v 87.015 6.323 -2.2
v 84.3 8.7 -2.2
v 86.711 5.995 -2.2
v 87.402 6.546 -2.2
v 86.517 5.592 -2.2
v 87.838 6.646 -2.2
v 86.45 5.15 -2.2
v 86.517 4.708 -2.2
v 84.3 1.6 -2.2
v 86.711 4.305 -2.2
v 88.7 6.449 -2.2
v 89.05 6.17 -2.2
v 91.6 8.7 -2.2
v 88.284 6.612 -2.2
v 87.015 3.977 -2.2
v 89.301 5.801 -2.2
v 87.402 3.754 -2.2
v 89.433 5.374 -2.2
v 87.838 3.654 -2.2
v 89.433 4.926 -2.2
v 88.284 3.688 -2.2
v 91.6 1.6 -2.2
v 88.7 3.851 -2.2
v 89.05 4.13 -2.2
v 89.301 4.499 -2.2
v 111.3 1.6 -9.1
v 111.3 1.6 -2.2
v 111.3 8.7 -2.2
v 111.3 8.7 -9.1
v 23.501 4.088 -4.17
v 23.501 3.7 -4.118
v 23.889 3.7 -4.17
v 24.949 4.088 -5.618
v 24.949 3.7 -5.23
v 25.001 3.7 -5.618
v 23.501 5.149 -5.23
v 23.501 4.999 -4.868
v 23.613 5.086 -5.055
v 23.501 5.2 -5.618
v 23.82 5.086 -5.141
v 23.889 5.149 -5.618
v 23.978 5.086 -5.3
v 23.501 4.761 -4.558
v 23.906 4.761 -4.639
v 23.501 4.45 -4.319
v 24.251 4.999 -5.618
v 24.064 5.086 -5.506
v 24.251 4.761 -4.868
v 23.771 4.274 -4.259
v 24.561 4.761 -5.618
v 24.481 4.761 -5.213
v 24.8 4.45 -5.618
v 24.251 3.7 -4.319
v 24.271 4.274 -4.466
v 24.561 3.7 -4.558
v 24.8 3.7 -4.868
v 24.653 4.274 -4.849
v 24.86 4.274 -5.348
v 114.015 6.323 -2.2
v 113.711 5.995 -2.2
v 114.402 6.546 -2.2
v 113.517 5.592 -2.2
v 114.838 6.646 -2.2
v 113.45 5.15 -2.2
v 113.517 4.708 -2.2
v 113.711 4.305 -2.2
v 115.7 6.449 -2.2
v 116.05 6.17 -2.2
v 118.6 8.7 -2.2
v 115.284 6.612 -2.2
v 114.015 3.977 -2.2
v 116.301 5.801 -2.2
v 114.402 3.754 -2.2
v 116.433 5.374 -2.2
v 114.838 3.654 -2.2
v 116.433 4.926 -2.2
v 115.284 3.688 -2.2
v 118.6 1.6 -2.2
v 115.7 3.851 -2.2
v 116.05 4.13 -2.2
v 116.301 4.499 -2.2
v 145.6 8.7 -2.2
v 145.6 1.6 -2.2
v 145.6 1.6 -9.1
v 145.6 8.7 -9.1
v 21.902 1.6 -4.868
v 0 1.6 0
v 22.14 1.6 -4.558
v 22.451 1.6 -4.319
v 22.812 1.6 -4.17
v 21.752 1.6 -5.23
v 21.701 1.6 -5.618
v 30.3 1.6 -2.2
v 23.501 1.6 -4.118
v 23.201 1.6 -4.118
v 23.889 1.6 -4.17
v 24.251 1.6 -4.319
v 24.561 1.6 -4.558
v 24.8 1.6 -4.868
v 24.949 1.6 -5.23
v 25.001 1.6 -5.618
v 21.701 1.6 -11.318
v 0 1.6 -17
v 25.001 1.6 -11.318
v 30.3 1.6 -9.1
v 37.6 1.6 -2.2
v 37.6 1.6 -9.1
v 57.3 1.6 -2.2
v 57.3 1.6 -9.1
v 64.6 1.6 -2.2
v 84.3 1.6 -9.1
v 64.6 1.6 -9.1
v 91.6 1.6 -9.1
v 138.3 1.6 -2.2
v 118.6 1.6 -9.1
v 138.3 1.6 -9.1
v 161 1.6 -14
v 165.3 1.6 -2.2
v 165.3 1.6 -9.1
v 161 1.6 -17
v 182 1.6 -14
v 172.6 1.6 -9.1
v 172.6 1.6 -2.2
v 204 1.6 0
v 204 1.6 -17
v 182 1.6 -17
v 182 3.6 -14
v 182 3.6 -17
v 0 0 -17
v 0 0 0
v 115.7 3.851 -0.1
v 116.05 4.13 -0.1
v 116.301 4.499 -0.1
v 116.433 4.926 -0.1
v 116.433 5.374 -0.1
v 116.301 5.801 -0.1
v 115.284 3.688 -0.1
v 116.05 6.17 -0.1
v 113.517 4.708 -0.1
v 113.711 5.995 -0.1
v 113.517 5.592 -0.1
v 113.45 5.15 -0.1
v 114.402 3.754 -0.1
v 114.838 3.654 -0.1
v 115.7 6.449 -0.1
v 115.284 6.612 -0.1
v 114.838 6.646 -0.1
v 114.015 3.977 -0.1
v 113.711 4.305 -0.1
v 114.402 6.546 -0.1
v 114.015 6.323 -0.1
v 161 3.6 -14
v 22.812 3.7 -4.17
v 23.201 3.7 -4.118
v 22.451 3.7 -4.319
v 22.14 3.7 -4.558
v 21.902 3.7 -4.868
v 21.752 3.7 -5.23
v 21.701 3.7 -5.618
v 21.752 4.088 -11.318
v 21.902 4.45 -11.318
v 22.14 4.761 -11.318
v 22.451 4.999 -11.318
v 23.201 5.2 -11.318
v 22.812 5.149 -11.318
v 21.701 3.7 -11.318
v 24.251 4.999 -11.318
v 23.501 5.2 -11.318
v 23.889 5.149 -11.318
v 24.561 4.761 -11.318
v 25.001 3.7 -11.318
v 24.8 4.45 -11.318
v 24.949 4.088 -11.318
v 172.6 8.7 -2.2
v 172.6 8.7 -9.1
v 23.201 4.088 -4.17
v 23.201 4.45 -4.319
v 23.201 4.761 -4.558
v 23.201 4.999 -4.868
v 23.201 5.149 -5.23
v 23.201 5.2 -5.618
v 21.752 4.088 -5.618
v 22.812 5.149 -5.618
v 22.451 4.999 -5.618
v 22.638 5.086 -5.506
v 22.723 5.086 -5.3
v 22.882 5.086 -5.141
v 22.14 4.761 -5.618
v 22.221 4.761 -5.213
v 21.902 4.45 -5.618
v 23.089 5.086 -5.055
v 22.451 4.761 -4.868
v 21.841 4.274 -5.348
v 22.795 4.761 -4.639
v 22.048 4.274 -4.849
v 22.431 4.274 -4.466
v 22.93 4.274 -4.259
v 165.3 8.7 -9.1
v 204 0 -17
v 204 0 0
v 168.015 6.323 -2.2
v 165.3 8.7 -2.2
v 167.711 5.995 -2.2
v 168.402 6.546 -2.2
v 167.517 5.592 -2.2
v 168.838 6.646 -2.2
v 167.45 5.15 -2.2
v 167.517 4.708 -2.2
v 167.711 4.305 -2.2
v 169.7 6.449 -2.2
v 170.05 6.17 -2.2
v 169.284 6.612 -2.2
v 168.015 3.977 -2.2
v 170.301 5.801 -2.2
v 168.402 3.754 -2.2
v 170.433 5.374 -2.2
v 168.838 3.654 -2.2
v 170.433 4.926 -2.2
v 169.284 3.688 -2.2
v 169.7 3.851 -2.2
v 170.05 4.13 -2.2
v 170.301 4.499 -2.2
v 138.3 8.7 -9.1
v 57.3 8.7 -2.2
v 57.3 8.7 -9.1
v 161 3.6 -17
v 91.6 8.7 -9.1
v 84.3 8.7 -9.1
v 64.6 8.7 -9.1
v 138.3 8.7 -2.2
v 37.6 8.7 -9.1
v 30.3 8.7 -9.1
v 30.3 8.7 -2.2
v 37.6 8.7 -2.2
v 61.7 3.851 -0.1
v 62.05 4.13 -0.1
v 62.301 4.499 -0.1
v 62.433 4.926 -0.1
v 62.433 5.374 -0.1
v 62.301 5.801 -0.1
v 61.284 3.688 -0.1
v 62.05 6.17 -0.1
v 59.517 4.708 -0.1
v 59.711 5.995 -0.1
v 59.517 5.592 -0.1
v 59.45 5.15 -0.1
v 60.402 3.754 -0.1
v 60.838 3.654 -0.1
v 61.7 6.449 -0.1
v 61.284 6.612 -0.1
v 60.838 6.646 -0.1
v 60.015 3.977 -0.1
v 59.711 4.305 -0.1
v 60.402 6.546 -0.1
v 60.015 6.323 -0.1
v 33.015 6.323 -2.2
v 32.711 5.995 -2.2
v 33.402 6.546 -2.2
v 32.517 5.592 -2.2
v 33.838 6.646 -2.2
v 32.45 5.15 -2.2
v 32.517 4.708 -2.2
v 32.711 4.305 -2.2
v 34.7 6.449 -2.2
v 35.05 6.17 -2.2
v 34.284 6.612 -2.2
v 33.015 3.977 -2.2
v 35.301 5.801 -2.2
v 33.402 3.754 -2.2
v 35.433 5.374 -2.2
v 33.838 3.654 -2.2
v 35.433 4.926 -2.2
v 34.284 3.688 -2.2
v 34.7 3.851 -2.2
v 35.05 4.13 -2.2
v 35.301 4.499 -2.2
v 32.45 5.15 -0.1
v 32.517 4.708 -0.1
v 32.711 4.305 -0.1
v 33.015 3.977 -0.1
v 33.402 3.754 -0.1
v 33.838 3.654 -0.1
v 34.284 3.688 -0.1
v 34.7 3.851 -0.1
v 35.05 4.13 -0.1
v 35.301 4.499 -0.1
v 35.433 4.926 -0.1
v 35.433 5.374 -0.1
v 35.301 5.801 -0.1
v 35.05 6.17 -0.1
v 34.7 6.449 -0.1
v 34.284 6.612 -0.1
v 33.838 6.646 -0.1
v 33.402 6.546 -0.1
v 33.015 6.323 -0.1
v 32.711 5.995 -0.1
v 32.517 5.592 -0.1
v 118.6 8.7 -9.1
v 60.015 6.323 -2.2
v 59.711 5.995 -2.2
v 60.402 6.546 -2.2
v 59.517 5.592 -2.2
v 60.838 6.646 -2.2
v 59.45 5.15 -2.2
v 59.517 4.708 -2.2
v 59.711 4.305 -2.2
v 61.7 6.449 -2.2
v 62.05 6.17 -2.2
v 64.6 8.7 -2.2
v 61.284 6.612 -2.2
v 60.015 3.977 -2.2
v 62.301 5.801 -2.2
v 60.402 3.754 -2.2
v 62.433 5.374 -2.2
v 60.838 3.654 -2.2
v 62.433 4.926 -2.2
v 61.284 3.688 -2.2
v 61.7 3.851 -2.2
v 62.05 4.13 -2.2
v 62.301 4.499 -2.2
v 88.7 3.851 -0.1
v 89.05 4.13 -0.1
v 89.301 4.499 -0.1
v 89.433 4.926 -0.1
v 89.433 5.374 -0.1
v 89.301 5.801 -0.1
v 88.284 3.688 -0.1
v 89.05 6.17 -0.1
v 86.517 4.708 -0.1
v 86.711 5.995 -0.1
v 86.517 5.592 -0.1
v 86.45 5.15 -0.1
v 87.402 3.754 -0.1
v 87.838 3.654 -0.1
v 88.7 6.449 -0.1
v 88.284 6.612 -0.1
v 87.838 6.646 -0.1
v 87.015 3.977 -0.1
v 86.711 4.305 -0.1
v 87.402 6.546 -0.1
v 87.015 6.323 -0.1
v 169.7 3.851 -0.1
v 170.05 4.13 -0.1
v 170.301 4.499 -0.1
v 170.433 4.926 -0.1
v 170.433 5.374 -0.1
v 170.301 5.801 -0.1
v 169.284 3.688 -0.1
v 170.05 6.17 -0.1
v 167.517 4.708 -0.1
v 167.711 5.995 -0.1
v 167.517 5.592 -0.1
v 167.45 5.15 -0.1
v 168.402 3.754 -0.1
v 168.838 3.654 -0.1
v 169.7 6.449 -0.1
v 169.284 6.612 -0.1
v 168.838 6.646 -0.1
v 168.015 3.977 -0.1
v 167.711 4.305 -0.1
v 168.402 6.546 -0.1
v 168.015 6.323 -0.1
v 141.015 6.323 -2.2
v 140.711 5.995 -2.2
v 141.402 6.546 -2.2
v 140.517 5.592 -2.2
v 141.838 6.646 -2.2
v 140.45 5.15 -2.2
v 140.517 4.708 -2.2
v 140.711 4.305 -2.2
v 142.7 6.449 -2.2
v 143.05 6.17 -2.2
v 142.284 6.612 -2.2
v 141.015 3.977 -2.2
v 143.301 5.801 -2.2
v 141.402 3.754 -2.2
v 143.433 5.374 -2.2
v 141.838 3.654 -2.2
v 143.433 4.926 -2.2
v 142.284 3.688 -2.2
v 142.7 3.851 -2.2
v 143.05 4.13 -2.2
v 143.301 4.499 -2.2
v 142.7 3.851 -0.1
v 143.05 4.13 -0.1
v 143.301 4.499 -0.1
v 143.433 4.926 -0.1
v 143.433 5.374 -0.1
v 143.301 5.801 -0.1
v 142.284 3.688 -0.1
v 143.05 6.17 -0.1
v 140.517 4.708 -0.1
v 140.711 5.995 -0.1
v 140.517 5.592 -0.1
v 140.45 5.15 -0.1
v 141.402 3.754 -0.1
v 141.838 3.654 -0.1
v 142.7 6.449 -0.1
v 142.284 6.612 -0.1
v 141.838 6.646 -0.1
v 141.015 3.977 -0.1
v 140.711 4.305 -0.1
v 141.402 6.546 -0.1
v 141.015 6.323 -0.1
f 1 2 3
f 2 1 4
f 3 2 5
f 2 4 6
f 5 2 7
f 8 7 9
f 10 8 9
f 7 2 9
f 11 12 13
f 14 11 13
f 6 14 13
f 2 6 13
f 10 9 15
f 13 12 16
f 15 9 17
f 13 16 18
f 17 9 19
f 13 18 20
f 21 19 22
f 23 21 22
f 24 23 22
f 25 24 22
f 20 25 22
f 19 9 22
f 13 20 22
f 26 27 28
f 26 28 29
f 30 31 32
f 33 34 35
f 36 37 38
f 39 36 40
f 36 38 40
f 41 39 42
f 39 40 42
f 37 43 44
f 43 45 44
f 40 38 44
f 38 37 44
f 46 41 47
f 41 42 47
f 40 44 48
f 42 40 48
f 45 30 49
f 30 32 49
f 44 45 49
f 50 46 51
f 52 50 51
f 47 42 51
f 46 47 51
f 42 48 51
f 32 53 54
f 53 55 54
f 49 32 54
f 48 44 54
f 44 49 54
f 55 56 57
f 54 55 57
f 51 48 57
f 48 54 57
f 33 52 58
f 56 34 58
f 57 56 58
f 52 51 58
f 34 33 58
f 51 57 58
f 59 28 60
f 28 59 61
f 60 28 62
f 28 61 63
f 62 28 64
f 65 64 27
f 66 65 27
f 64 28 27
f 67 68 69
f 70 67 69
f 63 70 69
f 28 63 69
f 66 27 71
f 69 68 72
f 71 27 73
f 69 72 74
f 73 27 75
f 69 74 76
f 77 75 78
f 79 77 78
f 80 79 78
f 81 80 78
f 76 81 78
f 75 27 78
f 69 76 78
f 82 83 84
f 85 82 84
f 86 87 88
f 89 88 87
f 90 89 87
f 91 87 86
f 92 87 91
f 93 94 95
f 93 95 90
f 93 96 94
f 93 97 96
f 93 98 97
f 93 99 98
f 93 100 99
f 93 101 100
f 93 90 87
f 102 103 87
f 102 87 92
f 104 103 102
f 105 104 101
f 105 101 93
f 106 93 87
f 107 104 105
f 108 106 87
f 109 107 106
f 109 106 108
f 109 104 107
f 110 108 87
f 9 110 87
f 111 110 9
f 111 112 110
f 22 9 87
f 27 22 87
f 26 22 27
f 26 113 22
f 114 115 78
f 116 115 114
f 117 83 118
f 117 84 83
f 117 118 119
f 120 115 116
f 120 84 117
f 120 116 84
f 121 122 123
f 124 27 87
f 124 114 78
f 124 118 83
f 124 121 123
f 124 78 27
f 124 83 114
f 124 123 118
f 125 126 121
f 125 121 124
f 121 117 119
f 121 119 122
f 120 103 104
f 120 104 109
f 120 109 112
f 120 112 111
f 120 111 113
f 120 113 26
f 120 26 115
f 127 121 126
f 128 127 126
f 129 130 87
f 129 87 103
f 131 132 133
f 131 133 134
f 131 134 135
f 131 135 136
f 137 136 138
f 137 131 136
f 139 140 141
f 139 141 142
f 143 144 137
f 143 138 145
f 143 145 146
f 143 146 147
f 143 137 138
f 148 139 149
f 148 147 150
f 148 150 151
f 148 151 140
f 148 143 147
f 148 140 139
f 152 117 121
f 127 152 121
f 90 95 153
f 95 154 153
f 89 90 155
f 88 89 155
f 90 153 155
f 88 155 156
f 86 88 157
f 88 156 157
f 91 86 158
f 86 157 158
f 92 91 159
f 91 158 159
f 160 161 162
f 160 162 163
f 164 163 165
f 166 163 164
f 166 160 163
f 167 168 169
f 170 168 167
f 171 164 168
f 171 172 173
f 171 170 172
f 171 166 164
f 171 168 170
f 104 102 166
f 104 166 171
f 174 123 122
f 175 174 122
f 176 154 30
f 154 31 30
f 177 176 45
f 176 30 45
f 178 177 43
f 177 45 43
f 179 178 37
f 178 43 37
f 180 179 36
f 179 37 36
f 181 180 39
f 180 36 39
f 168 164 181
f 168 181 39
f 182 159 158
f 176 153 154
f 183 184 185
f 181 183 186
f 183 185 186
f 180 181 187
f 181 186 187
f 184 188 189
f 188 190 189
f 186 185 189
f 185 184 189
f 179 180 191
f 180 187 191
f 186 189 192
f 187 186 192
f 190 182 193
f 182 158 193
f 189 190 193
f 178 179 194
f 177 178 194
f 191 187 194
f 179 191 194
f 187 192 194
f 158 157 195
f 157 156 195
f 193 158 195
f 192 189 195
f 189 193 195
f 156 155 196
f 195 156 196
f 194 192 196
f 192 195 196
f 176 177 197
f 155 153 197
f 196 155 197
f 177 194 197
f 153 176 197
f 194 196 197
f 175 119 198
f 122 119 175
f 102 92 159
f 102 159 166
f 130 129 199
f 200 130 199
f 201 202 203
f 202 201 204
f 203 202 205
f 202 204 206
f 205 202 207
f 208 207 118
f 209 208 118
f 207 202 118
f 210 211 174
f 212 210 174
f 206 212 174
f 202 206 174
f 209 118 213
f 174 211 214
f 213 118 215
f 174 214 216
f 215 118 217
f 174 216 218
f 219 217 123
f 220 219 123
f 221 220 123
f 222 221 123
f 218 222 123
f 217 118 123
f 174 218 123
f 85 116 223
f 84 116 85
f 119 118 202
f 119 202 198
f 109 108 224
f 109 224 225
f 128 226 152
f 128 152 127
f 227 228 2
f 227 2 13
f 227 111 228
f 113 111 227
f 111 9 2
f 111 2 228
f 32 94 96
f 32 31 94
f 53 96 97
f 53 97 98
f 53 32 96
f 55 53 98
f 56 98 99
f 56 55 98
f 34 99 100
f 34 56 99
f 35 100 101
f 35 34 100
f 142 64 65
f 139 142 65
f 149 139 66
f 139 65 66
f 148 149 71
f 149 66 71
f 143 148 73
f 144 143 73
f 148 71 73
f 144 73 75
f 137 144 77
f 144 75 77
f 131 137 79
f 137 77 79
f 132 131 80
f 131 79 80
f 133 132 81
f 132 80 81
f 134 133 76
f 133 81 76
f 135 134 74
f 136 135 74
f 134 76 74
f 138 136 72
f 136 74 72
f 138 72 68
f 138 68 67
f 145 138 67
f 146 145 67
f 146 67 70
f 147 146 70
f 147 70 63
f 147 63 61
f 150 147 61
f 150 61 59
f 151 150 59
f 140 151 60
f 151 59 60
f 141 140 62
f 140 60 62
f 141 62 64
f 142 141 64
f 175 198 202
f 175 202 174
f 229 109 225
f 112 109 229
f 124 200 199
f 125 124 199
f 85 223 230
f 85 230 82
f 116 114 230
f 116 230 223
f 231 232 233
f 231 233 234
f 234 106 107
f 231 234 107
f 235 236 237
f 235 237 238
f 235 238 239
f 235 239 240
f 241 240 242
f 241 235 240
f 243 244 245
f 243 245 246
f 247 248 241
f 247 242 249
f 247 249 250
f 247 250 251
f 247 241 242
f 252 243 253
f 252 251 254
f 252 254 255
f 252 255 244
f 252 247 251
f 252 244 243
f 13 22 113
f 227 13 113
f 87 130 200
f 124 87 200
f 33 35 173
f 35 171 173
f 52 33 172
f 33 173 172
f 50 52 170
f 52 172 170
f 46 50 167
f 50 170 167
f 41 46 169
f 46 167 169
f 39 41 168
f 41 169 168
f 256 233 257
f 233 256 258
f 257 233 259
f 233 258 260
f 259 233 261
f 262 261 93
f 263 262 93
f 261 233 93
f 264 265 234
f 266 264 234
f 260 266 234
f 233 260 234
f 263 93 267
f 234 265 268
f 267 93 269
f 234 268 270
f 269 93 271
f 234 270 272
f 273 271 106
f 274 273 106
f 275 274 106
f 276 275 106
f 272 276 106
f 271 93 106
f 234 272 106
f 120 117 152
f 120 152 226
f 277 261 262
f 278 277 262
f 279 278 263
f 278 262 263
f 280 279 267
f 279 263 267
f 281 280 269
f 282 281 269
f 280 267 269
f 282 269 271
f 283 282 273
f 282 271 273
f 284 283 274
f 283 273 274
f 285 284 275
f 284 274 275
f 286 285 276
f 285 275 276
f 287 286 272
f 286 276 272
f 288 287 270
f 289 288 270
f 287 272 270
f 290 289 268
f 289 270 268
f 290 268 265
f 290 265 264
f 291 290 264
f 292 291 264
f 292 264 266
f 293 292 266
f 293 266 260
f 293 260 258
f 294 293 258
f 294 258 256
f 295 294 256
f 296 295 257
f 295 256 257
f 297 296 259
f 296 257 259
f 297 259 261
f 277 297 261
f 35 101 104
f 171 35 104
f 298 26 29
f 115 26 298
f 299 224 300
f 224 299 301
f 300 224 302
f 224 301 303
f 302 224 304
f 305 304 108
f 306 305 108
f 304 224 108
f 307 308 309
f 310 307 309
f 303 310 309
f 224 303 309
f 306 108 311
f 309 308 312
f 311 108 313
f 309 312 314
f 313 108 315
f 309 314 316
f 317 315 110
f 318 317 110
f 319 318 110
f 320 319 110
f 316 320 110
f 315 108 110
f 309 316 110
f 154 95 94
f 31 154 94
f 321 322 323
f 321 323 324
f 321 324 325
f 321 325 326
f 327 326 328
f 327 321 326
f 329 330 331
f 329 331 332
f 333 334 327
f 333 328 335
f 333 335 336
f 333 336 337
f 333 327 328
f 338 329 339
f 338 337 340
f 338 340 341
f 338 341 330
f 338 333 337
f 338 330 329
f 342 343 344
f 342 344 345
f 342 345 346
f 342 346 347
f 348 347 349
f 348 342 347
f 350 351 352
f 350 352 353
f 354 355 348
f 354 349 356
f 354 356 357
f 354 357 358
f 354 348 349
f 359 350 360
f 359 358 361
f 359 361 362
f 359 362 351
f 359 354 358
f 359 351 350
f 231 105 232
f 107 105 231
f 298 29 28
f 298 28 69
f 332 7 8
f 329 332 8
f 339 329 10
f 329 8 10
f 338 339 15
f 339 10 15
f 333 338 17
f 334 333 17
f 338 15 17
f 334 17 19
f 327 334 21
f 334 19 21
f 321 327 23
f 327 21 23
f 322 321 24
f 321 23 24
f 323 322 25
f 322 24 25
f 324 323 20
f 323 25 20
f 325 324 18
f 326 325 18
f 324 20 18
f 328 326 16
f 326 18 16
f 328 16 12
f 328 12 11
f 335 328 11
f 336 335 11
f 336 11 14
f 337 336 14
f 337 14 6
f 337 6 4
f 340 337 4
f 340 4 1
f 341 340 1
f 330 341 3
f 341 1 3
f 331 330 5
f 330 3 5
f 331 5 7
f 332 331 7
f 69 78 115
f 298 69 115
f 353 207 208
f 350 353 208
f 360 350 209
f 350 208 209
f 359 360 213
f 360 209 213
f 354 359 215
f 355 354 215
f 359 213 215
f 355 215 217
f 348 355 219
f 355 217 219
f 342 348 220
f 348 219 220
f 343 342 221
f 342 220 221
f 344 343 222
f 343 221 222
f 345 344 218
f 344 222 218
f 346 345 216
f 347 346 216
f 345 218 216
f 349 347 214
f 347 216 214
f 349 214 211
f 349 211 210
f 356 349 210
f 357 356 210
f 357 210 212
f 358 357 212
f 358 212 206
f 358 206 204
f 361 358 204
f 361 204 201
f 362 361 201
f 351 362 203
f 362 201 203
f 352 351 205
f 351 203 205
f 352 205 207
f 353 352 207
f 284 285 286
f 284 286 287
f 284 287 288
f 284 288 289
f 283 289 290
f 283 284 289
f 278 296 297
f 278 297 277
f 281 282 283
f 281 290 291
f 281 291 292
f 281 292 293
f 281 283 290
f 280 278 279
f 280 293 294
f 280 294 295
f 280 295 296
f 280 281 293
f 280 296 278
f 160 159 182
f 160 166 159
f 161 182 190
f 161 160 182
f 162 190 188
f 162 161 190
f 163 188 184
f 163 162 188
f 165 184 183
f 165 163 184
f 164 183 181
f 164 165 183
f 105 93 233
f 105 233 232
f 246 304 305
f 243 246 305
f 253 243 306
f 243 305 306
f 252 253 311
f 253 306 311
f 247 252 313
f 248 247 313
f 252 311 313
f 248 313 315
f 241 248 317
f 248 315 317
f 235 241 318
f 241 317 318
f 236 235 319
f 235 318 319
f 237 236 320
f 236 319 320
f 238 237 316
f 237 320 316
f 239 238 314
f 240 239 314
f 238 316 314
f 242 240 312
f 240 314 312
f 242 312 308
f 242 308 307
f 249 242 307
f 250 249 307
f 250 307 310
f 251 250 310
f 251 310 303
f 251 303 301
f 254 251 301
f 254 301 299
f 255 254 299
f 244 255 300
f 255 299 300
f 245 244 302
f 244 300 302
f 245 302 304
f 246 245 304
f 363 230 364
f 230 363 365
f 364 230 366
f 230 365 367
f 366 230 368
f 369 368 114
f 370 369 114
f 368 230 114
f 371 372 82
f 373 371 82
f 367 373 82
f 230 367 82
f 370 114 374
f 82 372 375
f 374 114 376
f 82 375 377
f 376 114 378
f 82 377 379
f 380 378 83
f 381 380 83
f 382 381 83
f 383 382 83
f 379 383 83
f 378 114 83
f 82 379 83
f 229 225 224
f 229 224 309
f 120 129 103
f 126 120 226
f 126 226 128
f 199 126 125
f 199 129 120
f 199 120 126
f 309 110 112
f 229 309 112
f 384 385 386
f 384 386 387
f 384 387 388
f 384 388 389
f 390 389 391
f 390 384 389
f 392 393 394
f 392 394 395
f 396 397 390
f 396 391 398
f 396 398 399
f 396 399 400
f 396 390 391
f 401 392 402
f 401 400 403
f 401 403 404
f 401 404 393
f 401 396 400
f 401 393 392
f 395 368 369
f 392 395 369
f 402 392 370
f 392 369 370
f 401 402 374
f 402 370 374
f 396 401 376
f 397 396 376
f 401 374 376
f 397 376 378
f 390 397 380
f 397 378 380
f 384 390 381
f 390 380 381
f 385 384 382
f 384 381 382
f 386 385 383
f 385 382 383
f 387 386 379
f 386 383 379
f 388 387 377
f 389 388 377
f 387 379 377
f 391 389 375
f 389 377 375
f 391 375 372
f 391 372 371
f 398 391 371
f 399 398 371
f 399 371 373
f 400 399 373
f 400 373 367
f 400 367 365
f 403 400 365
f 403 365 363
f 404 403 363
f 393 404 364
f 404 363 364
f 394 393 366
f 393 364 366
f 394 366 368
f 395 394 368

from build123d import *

# Parameters (mm, degrees)
SKETCH1_W           = 204
SKETCH1_H           = 17
BOSS_EXTRUDE1_DEPTH = 1.6
SKETCH2_W           = 7.3
SKETCH2_H           = 6.9
BOSS_EXTRUDE2_DEPTH = 7.1
SKETCH6_R           = 1.5
BOSS_EXTRUDE6_DEPTH = 2.1
SKETCH4_W           = 3.3
SKETCH4_H           = 7.2
BOSS_EXTRUDE4_DEPTH = 3.6
SKETCH5_W           = 21
SKETCH5_H           = 3
BOSS_EXTRUDE5_DEPTH = 2
LPATTERN1_COUNT     = 6
LPATTERN1_PITCH     = 27
FILLET1_R           = 1.5


with BuildPart() as part:
    # Sketch1 → Boss-Extrude1 (new body)
    with BuildSketch(Plane(origin=(0, 0, 0), x_dir=(1, 0, 0), z_dir=(0, 1, 0))):
        with Locations((102, 8.5)):
            Rectangle(SKETCH1_W, SKETCH1_H)
    extrude(amount=BOSS_EXTRUDE1_DEPTH)

    # Sketch2 → Boss-Extrude2 (add)
    with BuildSketch(Plane(origin=(0, 1.6, 0), x_dir=(1, 0, 0), z_dir=(0, 1, 0))):
        with Locations((33.95, 5.65)):
            Rectangle(SKETCH2_W, SKETCH2_H)
    boss_extrude2 = extrude(amount=BOSS_EXTRUDE2_DEPTH)

    # Sketch6 → Boss-Extrude6 (add)
    with BuildSketch(Plane.XY.offset(-2.2)):
        with Locations(Location((33.95, 5.15, 0), (0, 0, 180))):
            Circle(SKETCH6_R)
    boss_extrude6 = extrude(amount=BOSS_EXTRUDE6_DEPTH)

    # Sketch4 → Boss-Extrude4 (add)
    with BuildSketch(Plane(origin=(0, 1.6, 0), x_dir=(1, 0, 0), z_dir=(0, 1, 0))):
        with Locations((23.350594588, 7.718433613)):
            Rectangle(SKETCH4_W, SKETCH4_H)
    extrude(amount=BOSS_EXTRUDE4_DEPTH)

    # Sketch5 → Boss-Extrude5 (add)
    with BuildSketch(Plane(origin=(0, 1.6, 0), x_dir=(1, 0, 0), z_dir=(0, 1, 0))):
        with Locations((171.5, 15.5)):
            Rectangle(SKETCH5_W, SKETCH5_H)
    extrude(amount=BOSS_EXTRUDE5_DEPTH)

    # LPattern1: Boss-Extrude2, Boss-Extrude6 ×6
    with Locations(*[(i * LPATTERN1_PITCH, 0, 0) for i in range(1, LPATTERN1_COUNT)]):
        add(boss_extrude2)
        add(boss_extrude6)

    # Fillet1
    fillet1_edges = [part.edges().sort_by_distance(p)[0] for p in [
        (21.700594588, 3.4, -4.118433613),
        (25.000594588, 3.4, -4.118433613),
        (21.700594588, 5.2, -7.718433613),
        (23.350594588, 5.2, -4.118433613),
        (25.000594588, 5.2, -7.718433613),
    ]]
    fillet(fillet1_edges, radius=FILLET1_R)


solid = part.part
